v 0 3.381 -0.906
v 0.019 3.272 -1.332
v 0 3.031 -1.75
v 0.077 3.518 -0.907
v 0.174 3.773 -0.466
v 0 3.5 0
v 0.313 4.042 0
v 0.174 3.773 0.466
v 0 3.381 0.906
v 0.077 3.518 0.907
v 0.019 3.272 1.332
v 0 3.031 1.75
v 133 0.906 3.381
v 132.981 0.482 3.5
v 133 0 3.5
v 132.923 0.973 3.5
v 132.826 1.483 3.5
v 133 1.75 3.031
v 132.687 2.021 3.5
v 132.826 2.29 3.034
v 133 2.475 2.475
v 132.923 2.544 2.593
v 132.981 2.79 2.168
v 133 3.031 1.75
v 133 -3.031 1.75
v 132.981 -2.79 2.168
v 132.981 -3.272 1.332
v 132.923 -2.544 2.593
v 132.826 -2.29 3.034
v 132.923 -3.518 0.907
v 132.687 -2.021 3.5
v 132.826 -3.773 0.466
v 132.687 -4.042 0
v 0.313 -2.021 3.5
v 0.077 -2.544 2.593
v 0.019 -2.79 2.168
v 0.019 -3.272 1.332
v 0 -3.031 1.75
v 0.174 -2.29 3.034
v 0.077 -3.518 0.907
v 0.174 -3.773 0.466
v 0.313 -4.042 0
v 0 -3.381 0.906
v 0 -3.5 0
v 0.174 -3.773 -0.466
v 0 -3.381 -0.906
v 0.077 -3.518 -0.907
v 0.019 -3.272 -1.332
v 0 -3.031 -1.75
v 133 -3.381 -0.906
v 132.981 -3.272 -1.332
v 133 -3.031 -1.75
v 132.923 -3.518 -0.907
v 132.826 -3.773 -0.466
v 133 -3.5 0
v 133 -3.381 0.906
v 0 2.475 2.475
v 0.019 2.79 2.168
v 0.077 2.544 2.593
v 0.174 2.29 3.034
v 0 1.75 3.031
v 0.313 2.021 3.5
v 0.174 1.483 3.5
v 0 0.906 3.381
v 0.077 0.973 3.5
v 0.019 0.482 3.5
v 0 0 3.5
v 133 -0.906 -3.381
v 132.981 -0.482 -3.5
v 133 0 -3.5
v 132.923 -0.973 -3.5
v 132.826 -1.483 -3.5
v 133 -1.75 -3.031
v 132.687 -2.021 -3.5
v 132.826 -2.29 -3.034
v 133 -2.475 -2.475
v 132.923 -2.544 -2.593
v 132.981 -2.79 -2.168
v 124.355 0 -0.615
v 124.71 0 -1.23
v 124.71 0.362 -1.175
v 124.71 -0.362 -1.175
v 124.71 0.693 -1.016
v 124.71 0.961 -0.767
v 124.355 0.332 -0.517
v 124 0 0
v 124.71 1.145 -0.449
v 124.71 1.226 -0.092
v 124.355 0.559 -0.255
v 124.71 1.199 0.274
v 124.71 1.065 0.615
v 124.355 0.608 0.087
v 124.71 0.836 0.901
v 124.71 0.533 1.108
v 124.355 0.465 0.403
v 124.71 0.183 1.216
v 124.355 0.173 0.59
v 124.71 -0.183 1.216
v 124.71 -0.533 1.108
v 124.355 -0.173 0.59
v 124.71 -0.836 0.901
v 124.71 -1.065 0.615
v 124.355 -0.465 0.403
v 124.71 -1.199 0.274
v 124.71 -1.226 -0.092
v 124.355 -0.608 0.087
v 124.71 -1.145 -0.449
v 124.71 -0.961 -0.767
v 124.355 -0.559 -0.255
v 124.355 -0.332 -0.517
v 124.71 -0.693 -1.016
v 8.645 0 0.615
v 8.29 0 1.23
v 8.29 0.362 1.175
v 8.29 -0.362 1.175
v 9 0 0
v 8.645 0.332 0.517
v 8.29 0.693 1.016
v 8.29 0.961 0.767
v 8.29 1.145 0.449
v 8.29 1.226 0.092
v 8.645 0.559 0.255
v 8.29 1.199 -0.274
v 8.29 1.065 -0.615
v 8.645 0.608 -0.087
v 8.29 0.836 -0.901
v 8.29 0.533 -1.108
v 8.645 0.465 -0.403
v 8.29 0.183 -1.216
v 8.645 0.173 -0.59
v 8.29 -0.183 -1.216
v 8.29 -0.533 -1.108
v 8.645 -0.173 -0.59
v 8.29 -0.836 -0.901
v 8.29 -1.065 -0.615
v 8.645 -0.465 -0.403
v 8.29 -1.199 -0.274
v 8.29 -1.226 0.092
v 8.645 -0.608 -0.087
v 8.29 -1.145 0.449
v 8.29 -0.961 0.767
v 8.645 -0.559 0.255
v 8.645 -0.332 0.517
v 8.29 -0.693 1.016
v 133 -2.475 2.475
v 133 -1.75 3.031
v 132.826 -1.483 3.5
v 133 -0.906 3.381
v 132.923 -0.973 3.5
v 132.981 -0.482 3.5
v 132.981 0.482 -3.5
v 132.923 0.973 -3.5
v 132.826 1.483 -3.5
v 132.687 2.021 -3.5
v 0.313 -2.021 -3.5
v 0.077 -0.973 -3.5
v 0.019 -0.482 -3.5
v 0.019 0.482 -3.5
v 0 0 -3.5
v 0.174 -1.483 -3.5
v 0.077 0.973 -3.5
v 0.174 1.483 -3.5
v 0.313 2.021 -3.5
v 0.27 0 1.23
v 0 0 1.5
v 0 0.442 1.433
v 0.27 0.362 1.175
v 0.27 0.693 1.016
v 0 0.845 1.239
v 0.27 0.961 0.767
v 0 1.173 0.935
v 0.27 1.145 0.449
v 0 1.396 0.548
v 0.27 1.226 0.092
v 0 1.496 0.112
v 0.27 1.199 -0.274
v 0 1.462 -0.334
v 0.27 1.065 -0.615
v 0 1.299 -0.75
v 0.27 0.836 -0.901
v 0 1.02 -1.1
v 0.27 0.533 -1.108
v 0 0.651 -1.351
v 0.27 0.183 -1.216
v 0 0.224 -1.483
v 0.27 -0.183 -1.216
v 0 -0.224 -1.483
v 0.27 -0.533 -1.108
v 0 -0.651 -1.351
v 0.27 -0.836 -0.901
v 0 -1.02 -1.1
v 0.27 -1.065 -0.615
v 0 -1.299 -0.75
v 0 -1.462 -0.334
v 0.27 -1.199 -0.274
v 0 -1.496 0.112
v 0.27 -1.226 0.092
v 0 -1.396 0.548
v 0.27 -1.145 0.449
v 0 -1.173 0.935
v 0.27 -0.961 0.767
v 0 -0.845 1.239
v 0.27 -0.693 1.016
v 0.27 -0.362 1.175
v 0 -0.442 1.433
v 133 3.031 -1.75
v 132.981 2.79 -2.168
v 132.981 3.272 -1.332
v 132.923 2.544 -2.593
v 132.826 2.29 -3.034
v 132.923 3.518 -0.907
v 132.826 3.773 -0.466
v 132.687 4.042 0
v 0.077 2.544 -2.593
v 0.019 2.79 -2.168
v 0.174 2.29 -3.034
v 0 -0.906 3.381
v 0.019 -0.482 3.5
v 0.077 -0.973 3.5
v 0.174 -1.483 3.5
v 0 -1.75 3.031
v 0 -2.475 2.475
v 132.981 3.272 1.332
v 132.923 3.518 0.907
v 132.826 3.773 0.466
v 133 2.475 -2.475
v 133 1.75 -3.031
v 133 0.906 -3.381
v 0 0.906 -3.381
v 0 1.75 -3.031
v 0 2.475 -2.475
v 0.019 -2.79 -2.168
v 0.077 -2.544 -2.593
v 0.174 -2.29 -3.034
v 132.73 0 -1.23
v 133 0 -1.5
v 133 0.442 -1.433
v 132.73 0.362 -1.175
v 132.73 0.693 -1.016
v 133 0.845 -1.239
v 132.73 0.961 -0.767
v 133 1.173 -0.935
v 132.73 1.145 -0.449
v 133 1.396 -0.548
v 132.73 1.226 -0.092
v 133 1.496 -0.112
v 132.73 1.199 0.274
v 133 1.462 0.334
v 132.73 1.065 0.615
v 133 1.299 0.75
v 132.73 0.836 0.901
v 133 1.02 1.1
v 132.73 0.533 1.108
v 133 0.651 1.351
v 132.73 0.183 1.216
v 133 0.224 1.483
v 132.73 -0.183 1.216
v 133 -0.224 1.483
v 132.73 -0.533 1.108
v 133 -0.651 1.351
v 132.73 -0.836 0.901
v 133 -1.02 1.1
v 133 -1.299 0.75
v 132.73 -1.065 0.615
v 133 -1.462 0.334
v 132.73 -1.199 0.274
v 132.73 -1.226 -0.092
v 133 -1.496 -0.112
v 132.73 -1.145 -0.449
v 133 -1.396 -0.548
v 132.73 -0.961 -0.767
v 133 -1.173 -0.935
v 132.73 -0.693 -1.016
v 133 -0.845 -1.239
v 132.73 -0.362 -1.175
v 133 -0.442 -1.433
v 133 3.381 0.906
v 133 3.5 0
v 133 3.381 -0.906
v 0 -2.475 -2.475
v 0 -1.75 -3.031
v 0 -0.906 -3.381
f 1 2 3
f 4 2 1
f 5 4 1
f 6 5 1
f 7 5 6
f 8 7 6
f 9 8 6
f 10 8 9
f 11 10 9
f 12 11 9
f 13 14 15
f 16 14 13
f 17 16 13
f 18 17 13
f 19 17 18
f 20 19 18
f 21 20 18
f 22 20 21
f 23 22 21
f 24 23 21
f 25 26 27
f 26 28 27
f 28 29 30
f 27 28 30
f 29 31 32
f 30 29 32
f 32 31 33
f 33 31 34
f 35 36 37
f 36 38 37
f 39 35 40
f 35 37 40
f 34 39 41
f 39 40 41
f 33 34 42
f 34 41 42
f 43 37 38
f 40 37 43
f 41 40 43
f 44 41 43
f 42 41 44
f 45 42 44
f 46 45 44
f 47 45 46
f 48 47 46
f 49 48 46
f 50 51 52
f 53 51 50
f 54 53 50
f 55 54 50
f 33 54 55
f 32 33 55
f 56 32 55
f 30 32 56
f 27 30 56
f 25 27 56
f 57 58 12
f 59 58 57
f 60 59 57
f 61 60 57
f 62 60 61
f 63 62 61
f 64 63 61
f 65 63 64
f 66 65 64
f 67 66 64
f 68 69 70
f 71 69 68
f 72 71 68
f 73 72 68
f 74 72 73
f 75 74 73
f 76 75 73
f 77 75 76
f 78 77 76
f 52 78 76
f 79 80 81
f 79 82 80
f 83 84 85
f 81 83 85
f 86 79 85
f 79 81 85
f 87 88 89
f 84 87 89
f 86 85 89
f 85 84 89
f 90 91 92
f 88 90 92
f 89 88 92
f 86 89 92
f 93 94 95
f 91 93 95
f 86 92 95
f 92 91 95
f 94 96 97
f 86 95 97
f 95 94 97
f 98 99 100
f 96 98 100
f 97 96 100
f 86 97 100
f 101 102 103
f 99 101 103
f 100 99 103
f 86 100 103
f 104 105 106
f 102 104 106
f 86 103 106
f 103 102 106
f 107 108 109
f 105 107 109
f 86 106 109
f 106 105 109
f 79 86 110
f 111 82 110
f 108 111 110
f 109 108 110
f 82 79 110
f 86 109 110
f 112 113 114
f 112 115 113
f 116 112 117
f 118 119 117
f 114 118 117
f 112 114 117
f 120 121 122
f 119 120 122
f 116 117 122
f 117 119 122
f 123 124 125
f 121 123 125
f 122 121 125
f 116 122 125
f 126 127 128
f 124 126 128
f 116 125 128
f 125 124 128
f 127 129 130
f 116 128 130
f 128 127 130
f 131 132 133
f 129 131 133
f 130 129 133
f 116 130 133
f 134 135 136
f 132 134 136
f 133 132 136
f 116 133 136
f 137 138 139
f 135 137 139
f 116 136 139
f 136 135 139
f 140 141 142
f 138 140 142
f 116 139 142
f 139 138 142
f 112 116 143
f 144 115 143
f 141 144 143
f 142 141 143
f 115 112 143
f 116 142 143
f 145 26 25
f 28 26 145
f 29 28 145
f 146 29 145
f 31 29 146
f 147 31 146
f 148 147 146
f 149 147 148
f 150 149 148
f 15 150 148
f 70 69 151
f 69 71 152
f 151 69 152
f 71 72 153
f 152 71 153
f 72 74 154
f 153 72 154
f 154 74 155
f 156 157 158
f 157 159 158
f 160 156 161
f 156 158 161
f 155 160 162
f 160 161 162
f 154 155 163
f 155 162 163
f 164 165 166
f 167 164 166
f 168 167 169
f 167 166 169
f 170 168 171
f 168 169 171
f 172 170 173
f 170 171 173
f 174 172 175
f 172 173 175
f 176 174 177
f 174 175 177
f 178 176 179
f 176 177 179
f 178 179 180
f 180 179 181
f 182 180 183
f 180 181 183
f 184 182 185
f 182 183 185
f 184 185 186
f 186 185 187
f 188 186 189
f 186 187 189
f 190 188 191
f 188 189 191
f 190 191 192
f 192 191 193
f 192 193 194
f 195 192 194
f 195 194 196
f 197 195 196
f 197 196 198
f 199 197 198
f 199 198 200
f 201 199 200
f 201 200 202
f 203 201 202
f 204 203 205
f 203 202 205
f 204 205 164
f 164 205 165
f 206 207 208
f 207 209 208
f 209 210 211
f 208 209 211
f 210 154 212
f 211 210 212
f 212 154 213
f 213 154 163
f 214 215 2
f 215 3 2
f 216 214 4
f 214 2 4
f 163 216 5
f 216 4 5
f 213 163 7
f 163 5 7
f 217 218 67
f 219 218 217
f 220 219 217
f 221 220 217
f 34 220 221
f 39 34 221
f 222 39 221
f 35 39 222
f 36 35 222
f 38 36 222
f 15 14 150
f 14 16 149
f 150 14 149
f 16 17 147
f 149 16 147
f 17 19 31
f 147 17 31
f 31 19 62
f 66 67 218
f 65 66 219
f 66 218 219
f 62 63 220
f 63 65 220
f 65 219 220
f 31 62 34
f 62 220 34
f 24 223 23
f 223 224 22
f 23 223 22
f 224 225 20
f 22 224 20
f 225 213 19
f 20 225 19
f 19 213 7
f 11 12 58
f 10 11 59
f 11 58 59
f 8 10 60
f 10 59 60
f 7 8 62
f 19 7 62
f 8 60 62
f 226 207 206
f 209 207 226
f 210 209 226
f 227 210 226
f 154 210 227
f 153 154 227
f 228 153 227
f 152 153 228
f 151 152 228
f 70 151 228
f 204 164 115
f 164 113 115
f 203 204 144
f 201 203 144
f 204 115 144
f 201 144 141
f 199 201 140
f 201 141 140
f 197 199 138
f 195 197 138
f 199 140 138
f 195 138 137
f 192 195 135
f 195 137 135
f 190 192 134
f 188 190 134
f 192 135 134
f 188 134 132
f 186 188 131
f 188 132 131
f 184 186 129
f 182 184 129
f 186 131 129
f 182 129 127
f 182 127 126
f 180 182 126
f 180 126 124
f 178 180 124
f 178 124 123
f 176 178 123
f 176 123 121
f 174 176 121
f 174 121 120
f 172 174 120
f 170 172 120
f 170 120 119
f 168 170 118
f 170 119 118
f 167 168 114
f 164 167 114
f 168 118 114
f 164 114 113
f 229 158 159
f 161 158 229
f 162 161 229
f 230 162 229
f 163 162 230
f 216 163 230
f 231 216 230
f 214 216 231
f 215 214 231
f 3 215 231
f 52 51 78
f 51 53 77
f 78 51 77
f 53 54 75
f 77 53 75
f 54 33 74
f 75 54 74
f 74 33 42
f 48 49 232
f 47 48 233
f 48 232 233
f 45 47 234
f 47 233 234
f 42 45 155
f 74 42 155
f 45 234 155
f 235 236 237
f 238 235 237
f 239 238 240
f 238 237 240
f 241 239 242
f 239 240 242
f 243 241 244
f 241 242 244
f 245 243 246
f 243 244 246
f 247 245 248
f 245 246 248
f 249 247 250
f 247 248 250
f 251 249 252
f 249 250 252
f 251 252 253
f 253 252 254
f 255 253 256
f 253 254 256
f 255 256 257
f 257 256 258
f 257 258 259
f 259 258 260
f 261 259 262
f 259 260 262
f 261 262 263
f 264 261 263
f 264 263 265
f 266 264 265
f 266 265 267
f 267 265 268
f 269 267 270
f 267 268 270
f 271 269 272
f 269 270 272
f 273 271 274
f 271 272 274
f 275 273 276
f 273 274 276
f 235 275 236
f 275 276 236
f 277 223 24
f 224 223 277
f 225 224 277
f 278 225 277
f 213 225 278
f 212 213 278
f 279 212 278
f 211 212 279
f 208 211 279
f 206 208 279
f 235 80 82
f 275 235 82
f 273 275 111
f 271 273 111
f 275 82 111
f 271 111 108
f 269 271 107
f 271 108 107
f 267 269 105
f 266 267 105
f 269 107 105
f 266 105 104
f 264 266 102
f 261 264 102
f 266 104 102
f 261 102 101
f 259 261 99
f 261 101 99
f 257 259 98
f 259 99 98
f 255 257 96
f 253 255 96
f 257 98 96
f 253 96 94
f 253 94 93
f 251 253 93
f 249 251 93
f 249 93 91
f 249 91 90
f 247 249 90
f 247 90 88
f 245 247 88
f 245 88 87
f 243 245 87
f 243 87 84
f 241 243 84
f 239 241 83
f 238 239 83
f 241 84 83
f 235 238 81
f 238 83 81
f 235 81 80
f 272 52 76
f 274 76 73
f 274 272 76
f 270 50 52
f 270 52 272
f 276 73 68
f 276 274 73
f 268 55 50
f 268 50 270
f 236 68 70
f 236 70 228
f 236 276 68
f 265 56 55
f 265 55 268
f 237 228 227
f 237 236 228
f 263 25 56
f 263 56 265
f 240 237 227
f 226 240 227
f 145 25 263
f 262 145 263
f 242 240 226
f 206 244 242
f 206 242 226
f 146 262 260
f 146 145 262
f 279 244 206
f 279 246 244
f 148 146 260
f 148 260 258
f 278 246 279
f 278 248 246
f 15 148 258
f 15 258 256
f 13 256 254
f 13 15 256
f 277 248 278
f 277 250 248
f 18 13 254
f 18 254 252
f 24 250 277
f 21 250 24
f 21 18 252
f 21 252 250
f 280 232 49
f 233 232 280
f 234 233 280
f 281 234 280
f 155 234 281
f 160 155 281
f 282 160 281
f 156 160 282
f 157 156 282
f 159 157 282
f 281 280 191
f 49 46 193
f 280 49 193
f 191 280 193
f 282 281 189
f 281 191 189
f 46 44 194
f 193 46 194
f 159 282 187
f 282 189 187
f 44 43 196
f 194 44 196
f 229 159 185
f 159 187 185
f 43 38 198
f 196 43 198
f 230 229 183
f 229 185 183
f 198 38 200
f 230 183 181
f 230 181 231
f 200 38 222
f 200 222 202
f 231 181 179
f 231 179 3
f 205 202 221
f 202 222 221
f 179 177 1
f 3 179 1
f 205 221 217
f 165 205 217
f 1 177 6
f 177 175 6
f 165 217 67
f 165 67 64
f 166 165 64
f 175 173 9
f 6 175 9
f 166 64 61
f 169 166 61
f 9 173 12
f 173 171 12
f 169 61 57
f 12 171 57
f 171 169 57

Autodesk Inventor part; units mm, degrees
sketch "Sketch_1" plane through (0, 0, 0) normal (0, 0, 1) x (1, 0, 0)
  line L0 (133, 0) -> (0, 0)
  line L1 (0, 0) -> (0, 3.5)
  line L2 (0, 3.5) -> (0.6062, 4.55)
  line L3 (0.6062, 4.55) -> (132.3938, 4.55)
  line L4 (132.3938, 4.55) -> (133, 3.5)
  line L5 (133, 3.5) -> (133, 0)
  line L6 (133, 0) -> (0, 0)
revolve "Revolution1" add sketch "Sketch_1" angle 360 about axis through (133, 0, 0) along (1, 0, 0)
sketch "Sketch_2" plane through (0, 0, 0) normal (1, 0, 0) x (0, 1, 0)
  line L0 (7, 7) -> (-7, 7)
  line L1 (-7, 7) -> (-7, -7)
  line L2 (-7, -7) -> (7, -7)
  line L3 (7, -7) -> (7, 7)
  line L4 (-2.0207, 3.5) -> (-4.0415, 0)
  line L5 (-4.0415, 0) -> (-2.0207, -3.5)
  line L6 (-2.0207, -3.5) -> (2.0207, -3.5)
  line L7 (2.0207, -3.5) -> (4.0415, 0)
  line L8 (4.0415, 0) -> (2.0207, 3.5)
  line L9 (2.0207, 3.5) -> (-2.0207, 3.5)
extrude "Extrusion1" cut sketch "Sketch_2" along normal blind 133
sketch "Sketch3" plane through (0, 0, 0) normal (-1, 0, 0) x (0, 0, 1)
  point P0 (0, 0)
hole "Hole1" at (0, 0, 0) direction (1, 0, 0) diameter 2.459 depth 8.2901 tip angle 120 countersink diameter 3 countersink angle 90 thread size "M3x0.5" class "6H" standard "ISO Metric profile"
sketch "Sketch4" plane through (133, 0, 0) normal (1, 0, 0) x (0, 0, -1)
  point P0 (0, 0)
hole "Hole2" at (133, 0, 0) direction (-1, 0, 0) diameter 2.459 depth 8.2901 tip angle 120 countersink diameter 3 countersink angle 90 thread size "M3x0.5" class "6H" standard "ISO Metric profile"
ref_plane "C3_XY" through (133, 0, 0) normal (-1, 0, 0) x (0, 0, -1)
ref_plane "C3_YZ" through (133, 0, 0) normal (0, 0, -1) x (0, -1, 0)
ref_plane "C3_ZX" through (133, 0, 0) normal (0, -1, 0) x (-1, 0, 0)
properties part number "ABLSBF7-133-M3-N3"
